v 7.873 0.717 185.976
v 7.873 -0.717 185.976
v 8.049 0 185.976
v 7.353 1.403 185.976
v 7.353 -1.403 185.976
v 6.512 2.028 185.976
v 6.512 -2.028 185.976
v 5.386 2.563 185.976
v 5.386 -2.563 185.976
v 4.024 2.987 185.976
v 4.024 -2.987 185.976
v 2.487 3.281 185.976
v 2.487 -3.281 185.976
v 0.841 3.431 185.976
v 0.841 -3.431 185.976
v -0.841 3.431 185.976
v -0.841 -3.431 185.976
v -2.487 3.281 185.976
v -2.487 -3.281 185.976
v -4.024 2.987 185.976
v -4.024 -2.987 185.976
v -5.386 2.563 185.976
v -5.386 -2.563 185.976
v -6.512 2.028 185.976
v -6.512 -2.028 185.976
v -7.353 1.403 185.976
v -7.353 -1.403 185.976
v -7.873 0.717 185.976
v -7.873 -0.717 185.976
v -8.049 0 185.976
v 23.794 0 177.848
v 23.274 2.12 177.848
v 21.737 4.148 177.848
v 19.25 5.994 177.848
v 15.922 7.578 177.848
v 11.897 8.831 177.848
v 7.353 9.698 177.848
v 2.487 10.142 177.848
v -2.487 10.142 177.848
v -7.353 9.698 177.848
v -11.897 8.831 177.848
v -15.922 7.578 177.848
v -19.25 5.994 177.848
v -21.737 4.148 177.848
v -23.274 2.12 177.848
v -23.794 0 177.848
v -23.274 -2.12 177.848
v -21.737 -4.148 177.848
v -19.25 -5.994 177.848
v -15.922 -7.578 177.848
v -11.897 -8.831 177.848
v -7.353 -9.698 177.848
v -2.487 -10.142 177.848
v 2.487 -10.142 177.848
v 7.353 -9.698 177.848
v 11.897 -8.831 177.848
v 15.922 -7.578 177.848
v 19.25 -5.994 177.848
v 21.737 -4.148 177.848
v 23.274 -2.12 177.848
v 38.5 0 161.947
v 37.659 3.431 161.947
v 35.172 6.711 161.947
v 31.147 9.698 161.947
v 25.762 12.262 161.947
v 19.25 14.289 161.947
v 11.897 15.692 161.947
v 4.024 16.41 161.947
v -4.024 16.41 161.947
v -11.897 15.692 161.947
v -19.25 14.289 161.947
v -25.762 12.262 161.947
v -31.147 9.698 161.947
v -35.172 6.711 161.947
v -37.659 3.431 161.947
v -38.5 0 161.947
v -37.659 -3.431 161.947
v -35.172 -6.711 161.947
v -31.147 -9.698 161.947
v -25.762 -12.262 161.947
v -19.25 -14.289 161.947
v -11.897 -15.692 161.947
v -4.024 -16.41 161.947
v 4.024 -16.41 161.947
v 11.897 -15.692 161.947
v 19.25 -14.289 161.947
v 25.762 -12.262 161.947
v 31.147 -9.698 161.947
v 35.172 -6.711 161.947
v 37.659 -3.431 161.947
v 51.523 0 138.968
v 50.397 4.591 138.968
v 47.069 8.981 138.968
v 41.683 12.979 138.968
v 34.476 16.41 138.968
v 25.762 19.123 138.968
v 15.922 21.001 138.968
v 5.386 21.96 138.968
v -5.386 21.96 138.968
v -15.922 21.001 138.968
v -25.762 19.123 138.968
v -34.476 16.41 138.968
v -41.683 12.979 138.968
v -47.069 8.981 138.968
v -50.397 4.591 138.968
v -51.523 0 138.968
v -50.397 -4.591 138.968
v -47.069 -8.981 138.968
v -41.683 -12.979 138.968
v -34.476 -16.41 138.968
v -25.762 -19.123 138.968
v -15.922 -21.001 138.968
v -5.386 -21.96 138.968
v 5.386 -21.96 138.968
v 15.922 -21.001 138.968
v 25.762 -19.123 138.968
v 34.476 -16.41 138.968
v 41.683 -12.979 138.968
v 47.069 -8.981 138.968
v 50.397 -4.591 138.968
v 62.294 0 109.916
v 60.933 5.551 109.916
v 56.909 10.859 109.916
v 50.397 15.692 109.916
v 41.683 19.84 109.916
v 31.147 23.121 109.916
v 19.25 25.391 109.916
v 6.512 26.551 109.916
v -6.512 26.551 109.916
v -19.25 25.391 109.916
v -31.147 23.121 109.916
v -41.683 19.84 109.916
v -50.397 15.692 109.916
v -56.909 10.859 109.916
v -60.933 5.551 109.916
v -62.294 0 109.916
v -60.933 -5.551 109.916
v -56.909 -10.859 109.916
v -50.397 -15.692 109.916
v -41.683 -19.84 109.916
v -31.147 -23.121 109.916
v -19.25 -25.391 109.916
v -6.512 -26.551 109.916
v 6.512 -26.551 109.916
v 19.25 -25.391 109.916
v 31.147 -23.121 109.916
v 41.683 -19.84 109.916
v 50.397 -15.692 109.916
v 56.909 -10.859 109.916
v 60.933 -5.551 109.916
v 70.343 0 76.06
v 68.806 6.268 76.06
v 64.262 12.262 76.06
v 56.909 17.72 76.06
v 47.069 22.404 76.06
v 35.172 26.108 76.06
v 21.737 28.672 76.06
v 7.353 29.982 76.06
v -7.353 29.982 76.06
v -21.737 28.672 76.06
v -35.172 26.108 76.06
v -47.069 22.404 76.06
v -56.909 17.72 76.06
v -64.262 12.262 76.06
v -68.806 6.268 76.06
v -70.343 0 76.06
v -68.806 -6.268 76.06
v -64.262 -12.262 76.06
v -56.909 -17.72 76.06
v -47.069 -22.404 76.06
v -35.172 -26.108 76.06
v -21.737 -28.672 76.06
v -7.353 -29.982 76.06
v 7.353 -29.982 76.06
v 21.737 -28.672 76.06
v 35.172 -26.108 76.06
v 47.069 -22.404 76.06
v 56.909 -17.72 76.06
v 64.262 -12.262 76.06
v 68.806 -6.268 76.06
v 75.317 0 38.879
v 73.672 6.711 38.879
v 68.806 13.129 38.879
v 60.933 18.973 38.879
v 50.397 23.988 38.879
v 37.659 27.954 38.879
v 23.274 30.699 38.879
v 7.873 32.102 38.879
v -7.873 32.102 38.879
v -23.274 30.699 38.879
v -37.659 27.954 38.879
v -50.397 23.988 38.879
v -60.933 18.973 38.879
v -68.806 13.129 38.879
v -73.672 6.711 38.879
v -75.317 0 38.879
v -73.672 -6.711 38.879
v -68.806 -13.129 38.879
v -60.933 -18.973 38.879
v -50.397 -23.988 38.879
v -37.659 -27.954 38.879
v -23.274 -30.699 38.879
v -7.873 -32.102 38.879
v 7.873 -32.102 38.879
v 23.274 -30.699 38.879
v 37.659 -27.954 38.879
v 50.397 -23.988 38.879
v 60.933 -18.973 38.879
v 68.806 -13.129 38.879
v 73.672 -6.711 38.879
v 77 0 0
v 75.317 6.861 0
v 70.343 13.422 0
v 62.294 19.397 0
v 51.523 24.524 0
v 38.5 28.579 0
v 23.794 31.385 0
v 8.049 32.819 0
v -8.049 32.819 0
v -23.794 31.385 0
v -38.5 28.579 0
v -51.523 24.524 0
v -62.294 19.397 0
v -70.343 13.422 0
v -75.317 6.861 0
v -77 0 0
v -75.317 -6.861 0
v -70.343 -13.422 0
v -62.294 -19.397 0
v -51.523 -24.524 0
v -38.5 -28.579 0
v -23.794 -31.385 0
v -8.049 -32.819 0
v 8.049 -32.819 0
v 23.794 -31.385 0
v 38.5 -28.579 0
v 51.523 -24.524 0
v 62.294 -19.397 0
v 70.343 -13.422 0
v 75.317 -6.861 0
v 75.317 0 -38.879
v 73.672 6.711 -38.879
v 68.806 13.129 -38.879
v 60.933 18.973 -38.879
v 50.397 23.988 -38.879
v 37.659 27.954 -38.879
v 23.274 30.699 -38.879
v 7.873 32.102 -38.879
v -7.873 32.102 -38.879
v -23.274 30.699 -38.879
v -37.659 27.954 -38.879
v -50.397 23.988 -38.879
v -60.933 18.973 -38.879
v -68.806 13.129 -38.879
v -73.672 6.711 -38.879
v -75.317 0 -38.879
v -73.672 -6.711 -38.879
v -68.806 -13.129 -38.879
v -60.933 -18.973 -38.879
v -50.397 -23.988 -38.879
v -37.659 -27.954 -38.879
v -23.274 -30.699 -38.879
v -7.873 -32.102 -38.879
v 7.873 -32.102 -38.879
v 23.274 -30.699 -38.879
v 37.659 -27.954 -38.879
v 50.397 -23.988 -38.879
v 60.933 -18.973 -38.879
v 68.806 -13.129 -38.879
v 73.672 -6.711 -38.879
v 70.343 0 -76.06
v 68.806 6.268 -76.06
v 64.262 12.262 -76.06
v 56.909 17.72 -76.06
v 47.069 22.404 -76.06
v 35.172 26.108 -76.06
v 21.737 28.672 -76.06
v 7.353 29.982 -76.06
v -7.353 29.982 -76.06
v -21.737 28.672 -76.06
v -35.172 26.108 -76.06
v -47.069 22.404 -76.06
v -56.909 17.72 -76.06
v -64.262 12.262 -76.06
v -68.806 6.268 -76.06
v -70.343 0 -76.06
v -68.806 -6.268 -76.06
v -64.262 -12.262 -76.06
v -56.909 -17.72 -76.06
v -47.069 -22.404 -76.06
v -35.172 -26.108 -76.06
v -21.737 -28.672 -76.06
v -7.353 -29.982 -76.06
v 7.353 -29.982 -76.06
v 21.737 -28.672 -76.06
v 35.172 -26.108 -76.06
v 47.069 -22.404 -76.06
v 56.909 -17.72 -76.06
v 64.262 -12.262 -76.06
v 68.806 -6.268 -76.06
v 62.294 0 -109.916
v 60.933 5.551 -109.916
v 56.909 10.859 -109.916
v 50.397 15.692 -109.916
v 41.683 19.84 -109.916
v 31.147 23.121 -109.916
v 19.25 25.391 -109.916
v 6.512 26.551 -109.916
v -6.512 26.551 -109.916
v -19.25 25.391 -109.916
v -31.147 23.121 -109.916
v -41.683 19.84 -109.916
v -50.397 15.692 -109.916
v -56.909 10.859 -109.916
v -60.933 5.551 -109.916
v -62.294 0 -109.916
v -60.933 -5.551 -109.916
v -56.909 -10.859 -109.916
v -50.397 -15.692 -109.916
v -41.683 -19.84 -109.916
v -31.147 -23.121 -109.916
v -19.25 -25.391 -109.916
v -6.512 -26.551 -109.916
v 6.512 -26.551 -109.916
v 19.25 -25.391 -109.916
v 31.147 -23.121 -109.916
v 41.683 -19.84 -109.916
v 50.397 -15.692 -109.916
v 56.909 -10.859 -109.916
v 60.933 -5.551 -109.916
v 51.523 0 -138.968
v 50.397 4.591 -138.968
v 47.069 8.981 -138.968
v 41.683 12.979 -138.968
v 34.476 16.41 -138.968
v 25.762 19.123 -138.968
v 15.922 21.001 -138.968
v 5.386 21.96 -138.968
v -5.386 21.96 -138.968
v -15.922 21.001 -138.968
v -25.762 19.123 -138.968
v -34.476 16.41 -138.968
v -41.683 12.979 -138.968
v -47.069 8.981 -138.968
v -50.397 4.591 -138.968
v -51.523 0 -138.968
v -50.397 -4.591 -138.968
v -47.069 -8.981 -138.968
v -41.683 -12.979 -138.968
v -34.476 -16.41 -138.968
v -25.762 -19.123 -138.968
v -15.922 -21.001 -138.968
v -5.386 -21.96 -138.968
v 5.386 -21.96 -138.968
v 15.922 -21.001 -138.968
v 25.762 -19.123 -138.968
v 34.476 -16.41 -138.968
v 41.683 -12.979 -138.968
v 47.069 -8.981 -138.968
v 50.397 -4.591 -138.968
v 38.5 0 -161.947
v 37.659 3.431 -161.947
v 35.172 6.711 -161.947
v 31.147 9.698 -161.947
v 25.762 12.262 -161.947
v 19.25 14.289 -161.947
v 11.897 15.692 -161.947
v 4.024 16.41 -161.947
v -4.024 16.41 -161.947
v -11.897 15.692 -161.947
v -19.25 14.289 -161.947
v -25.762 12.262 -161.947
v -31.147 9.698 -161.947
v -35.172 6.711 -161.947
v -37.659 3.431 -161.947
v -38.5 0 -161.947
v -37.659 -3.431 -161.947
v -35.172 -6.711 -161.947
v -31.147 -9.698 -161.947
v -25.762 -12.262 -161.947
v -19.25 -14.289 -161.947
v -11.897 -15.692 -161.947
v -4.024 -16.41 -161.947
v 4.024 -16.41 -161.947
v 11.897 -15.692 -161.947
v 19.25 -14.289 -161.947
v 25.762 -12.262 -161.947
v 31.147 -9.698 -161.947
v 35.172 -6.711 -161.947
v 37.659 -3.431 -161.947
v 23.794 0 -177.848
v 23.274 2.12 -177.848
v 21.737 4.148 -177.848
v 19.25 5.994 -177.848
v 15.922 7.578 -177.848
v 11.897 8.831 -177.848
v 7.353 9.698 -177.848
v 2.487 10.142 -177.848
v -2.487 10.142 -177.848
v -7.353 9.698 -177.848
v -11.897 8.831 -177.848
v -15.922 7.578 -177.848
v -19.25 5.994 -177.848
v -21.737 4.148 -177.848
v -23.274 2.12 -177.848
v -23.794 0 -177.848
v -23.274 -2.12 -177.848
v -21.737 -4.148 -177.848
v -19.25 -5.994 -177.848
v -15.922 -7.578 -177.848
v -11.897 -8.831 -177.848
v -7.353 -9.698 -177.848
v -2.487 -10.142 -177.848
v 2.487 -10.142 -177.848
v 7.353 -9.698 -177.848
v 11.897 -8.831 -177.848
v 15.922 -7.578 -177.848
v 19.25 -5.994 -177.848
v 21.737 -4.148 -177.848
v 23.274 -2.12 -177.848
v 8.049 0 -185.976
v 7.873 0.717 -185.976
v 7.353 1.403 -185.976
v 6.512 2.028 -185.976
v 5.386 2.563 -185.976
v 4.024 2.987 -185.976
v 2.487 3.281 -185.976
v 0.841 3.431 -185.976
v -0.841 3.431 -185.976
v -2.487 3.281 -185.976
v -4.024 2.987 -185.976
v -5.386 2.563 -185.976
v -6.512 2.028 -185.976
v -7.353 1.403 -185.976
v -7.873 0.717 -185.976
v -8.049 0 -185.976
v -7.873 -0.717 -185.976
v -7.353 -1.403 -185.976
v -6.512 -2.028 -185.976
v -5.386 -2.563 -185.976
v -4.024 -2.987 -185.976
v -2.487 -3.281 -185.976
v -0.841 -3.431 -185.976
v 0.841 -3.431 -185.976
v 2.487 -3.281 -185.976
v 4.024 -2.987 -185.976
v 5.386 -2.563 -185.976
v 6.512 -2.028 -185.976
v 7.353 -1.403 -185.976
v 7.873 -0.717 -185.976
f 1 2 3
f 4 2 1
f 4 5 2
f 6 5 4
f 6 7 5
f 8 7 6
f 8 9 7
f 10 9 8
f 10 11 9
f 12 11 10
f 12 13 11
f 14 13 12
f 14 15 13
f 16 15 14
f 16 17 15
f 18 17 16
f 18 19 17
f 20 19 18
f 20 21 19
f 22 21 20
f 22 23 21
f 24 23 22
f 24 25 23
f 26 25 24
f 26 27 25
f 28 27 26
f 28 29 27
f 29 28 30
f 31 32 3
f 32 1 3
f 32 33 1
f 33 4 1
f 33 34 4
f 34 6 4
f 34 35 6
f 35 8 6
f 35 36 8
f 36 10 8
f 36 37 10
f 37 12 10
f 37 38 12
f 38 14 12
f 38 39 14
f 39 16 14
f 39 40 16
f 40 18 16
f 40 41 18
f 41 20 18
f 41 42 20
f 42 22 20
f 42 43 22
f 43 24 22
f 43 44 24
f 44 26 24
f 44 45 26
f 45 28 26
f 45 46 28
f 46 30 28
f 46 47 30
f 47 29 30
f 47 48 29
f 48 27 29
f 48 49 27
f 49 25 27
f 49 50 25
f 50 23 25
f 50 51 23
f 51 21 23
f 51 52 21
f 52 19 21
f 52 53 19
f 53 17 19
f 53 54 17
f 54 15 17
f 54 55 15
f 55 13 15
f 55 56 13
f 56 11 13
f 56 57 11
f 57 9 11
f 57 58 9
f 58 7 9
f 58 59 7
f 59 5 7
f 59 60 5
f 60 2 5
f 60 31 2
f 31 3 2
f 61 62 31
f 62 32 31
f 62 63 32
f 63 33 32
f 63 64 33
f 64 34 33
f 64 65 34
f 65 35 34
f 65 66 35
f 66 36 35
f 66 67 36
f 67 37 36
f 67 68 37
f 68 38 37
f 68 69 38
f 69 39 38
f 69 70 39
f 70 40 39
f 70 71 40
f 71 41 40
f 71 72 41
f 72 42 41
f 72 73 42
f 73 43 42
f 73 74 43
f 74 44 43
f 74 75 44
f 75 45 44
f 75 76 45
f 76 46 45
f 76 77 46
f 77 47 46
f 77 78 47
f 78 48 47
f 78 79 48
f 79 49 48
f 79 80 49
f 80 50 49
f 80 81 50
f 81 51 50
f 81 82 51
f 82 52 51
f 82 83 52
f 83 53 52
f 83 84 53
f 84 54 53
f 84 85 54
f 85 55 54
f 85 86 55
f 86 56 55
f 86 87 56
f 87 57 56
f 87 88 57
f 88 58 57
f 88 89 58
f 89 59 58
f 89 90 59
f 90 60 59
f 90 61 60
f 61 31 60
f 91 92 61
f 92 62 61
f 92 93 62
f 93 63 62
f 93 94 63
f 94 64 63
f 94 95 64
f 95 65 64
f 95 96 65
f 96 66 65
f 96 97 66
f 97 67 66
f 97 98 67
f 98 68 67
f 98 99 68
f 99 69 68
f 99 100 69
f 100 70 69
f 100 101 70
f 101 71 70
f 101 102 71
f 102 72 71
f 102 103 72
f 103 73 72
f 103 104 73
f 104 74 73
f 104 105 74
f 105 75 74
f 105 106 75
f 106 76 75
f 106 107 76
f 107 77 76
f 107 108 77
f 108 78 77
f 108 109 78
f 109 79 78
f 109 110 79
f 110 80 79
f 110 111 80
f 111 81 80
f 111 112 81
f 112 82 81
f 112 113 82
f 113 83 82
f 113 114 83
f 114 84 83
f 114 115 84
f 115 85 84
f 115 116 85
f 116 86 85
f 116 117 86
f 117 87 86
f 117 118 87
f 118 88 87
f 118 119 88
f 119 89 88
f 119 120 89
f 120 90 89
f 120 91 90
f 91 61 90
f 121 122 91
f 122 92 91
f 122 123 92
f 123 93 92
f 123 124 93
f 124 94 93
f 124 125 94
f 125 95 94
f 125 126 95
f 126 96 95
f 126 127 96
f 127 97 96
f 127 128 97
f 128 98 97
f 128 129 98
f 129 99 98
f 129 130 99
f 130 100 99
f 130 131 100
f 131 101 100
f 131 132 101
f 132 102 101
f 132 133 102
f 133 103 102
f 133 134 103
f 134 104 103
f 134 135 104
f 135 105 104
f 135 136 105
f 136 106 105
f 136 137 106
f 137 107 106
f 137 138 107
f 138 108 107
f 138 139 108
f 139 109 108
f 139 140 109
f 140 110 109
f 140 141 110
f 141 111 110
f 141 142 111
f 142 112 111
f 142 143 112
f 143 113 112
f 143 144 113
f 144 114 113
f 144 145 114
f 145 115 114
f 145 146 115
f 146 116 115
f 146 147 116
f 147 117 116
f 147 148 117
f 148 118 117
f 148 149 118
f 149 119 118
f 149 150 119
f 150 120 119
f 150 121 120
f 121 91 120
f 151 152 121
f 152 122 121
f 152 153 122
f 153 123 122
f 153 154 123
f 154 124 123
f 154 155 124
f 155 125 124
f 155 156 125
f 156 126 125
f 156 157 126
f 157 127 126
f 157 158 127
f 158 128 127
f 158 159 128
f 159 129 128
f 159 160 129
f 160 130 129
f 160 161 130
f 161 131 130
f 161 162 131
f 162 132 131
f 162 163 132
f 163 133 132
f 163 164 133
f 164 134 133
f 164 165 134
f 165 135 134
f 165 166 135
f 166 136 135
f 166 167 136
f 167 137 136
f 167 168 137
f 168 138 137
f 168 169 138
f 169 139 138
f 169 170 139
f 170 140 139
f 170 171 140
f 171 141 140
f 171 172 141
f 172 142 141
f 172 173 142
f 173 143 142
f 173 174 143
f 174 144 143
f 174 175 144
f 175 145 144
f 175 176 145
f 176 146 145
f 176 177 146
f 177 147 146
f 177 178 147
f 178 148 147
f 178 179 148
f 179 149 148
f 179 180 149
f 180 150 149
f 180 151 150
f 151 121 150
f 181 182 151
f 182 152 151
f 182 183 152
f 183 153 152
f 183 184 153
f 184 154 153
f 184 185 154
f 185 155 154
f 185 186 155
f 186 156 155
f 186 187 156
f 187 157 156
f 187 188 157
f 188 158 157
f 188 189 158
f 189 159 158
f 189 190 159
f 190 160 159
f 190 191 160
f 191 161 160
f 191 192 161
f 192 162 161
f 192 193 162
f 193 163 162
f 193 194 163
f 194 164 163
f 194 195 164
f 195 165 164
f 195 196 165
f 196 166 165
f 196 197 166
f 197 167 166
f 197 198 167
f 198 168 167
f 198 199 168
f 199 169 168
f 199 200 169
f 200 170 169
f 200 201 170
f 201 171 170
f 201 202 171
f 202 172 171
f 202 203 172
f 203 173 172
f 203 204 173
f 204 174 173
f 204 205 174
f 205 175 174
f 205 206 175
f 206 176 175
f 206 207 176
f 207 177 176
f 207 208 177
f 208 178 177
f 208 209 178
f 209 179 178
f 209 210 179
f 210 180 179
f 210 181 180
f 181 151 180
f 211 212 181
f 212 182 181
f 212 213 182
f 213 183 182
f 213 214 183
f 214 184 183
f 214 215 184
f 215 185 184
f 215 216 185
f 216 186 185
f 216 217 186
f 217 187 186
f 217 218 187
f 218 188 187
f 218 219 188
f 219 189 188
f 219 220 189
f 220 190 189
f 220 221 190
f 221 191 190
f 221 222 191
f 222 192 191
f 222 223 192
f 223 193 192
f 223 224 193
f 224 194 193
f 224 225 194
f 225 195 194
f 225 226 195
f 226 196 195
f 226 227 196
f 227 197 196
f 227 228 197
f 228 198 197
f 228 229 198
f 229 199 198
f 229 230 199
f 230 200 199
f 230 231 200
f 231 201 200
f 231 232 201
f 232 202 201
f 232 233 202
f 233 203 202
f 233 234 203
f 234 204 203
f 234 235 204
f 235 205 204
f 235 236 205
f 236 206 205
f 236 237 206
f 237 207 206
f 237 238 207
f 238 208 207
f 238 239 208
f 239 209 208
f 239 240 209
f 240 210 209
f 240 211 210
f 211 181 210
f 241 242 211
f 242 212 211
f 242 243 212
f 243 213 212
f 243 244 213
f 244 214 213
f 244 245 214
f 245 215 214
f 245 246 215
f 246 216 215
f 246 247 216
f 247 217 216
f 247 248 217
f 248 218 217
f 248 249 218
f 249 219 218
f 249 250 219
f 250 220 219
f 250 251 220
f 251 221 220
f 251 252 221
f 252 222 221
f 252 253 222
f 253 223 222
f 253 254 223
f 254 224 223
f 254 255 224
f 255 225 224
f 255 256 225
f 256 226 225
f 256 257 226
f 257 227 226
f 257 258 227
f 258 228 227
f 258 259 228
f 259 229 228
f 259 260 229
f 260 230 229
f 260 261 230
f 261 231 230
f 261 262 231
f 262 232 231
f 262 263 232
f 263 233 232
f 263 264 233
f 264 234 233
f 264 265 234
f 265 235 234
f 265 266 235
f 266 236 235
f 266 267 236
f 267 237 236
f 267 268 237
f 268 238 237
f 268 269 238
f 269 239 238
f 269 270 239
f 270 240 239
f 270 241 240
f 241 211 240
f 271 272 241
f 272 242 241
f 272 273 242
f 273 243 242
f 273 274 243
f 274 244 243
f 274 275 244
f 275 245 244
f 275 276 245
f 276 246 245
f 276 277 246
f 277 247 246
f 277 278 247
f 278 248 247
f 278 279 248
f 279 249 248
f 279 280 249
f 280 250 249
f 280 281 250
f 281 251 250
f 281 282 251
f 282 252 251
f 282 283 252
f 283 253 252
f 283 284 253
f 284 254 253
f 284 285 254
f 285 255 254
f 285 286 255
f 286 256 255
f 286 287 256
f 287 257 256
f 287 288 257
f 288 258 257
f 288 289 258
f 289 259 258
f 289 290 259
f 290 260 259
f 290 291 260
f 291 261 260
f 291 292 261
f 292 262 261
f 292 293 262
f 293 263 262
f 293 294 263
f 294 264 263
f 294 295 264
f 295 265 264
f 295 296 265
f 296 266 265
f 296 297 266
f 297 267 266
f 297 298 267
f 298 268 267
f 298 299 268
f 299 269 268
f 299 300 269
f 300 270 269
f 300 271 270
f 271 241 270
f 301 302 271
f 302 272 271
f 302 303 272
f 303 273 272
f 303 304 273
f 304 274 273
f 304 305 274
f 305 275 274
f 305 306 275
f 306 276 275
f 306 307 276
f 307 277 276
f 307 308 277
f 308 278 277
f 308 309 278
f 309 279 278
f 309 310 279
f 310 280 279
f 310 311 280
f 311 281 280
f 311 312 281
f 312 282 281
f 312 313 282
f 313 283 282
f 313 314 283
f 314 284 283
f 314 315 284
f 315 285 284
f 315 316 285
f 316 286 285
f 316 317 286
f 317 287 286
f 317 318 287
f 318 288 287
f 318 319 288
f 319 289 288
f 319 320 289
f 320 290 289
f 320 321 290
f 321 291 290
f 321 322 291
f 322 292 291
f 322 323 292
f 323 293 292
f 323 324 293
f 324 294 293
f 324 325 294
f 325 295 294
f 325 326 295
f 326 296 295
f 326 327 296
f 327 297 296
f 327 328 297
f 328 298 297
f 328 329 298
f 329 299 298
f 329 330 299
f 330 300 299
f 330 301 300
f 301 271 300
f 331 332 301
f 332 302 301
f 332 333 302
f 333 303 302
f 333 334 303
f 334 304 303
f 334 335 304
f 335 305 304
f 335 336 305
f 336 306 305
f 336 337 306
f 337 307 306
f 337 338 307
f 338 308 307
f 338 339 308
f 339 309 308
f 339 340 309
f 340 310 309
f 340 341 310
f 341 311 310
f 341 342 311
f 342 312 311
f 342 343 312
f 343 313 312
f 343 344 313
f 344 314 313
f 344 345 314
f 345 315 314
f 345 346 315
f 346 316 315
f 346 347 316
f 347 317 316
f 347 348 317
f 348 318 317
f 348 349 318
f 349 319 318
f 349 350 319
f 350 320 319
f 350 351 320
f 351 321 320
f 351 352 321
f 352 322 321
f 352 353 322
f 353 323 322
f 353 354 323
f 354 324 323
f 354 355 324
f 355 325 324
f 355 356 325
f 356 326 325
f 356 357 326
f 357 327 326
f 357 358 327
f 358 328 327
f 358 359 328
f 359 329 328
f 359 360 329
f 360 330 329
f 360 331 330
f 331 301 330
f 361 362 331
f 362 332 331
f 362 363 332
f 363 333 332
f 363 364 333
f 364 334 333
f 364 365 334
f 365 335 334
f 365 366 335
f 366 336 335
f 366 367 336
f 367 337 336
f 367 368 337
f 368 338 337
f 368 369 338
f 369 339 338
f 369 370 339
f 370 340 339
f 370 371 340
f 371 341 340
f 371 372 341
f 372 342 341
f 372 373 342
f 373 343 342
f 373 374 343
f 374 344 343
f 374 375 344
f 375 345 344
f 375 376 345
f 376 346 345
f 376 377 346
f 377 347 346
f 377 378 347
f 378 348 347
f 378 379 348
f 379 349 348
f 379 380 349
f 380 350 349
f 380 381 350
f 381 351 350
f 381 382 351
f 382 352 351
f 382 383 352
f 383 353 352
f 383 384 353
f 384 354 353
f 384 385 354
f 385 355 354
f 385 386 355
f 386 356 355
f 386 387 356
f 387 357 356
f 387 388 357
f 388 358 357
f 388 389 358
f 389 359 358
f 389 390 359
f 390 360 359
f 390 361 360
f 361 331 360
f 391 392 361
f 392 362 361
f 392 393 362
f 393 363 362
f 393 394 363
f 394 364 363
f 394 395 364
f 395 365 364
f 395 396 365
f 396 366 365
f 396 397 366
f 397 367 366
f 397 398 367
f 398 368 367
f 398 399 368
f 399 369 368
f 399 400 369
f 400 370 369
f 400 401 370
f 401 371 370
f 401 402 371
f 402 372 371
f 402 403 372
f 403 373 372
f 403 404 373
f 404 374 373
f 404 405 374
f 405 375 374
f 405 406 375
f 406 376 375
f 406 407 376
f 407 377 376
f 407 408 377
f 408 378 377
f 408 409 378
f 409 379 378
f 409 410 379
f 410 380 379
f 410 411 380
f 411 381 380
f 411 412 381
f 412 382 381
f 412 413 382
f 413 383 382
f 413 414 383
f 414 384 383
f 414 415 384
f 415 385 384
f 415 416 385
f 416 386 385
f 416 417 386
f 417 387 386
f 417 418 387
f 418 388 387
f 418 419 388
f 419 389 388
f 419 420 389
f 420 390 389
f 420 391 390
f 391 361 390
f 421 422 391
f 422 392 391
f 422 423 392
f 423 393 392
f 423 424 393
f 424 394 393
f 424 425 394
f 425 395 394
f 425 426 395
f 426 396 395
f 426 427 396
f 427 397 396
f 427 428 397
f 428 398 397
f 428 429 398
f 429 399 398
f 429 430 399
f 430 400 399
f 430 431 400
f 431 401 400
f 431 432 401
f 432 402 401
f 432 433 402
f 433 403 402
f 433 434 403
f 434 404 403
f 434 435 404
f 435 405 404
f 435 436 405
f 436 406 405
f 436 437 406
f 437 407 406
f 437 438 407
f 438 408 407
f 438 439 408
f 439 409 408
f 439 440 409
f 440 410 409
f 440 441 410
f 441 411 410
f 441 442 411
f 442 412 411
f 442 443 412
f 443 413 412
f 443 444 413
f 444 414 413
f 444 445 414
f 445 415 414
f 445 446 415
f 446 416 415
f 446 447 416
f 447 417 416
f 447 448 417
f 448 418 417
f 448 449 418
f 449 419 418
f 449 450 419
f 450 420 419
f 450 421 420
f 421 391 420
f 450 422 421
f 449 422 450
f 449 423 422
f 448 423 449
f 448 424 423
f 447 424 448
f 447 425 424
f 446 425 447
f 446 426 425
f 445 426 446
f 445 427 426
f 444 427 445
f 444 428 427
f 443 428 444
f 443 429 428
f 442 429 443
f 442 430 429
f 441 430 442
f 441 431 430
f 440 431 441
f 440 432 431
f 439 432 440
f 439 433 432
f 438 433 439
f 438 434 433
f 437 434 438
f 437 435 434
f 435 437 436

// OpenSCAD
// Generated by SolidPython 1.0.1 on 2020-07-29 00:46:47


scale(v = [7, 3, 17]) {
	sphere(r = 11);
}
/***********************************************
*********      SolidPython code:      **********
************************************************
 
# import packages: SolidPython
from solid import *
from solid.utils import *
from itertools import chain, combinations, permutations


class Resize:

    def __init__(self, scad_file):
        self.scad_file = scad_file
        #self.scad_file = import_scad(scad_file)
        # cone/cylinder param:
        self.r1 = 0
        self.r2 = 0
        self.h = 0
        # rectangular prism param:
        self.w = 0
        self.l = 0
        # ellipse param:
        self.r = 0

    # import OpenScad code (file name corresponds to shape)


    # classify shape + parameters
    def assign(self, param1, param2, param3):
        if self.scad_file == 'cone.scad':
            self.r1 = param1
            self.r2 = param2
            self.h = param3
        elif self.scad_file == 'cylinder.scad':
            self.r1 = param1
            self.r2 = param2
            self.h = param3
        elif self.scad_file == 'rectangularPrism.scad':
            self.h = param1
            self.l = param2
            self.w = param3
        else:
            self.r = param1
            self.h = param2

    # resize parameters
    def iterate(self):
        x = range(3, 20, 2)
        i = 1
        if self.scad_file == 'cone.scad':
            tempList = list(permutations(x, 2))
            for temp in tempList:
                param1 = temp[0]
                param2 = temp[1]
                filepath = 'produced_scad_files/' + 'cone' + str(param1) + '_' + str(param2) + '_' + '.scad'
                scad_render_to_file(cylinder(h=param1, r1=param2, r2=0), filepath)

        elif self.scad_file == 'cylinder.scad':
            tempList = list(permutations(x, 3))
            for temp in tempList:
                param1 = temp[0]
                param2 = temp[1]
                filepath = 'produced_scad_files/' + 'cylinder' + str(param1) + '_' + str(param2) + '_' + '.scad'
                scad_render_to_file(cylinder(h=param1, r1=param2, r2=param2), filepath)

        elif self.scad_file == 'rectangularPrism.scad':
            tempList = list(permutations(x, 3))
            for temp in tempList:
                param1 = temp[0]
                param2 = temp[1]
                param3 = temp[2]
                filepath = 'produced_scad_files/' + 'rectangularPrism' + str(param1) + '_' + str(param2) + '_' + str(
                    param3) + '.scad'
                scad_render_to_file(cube(size=(param1, param2, param3)), filepath)

        elif self.scad_file == 'ellipse.scad':
            tempList = list(permutations(x, 4))
            for temp in tempList:
                param1 = temp[0]
                param2 = temp[1]
                param3 = temp[2]
                param4 = temp[3]
                filepath = 'produced_scad_files/' + 'ellipse' + str(param1) + '_' + str(param2) + '_' + str(param3) + '_' + str(param4) + '.scad'
                scad_render_to_file(scale([param1, param2, param3])(sphere(r=param4)), filepath)

    def render_to_scadfile(self):
        scad_render_to_file(scad, 'example.scad') 
 
************************************************/
